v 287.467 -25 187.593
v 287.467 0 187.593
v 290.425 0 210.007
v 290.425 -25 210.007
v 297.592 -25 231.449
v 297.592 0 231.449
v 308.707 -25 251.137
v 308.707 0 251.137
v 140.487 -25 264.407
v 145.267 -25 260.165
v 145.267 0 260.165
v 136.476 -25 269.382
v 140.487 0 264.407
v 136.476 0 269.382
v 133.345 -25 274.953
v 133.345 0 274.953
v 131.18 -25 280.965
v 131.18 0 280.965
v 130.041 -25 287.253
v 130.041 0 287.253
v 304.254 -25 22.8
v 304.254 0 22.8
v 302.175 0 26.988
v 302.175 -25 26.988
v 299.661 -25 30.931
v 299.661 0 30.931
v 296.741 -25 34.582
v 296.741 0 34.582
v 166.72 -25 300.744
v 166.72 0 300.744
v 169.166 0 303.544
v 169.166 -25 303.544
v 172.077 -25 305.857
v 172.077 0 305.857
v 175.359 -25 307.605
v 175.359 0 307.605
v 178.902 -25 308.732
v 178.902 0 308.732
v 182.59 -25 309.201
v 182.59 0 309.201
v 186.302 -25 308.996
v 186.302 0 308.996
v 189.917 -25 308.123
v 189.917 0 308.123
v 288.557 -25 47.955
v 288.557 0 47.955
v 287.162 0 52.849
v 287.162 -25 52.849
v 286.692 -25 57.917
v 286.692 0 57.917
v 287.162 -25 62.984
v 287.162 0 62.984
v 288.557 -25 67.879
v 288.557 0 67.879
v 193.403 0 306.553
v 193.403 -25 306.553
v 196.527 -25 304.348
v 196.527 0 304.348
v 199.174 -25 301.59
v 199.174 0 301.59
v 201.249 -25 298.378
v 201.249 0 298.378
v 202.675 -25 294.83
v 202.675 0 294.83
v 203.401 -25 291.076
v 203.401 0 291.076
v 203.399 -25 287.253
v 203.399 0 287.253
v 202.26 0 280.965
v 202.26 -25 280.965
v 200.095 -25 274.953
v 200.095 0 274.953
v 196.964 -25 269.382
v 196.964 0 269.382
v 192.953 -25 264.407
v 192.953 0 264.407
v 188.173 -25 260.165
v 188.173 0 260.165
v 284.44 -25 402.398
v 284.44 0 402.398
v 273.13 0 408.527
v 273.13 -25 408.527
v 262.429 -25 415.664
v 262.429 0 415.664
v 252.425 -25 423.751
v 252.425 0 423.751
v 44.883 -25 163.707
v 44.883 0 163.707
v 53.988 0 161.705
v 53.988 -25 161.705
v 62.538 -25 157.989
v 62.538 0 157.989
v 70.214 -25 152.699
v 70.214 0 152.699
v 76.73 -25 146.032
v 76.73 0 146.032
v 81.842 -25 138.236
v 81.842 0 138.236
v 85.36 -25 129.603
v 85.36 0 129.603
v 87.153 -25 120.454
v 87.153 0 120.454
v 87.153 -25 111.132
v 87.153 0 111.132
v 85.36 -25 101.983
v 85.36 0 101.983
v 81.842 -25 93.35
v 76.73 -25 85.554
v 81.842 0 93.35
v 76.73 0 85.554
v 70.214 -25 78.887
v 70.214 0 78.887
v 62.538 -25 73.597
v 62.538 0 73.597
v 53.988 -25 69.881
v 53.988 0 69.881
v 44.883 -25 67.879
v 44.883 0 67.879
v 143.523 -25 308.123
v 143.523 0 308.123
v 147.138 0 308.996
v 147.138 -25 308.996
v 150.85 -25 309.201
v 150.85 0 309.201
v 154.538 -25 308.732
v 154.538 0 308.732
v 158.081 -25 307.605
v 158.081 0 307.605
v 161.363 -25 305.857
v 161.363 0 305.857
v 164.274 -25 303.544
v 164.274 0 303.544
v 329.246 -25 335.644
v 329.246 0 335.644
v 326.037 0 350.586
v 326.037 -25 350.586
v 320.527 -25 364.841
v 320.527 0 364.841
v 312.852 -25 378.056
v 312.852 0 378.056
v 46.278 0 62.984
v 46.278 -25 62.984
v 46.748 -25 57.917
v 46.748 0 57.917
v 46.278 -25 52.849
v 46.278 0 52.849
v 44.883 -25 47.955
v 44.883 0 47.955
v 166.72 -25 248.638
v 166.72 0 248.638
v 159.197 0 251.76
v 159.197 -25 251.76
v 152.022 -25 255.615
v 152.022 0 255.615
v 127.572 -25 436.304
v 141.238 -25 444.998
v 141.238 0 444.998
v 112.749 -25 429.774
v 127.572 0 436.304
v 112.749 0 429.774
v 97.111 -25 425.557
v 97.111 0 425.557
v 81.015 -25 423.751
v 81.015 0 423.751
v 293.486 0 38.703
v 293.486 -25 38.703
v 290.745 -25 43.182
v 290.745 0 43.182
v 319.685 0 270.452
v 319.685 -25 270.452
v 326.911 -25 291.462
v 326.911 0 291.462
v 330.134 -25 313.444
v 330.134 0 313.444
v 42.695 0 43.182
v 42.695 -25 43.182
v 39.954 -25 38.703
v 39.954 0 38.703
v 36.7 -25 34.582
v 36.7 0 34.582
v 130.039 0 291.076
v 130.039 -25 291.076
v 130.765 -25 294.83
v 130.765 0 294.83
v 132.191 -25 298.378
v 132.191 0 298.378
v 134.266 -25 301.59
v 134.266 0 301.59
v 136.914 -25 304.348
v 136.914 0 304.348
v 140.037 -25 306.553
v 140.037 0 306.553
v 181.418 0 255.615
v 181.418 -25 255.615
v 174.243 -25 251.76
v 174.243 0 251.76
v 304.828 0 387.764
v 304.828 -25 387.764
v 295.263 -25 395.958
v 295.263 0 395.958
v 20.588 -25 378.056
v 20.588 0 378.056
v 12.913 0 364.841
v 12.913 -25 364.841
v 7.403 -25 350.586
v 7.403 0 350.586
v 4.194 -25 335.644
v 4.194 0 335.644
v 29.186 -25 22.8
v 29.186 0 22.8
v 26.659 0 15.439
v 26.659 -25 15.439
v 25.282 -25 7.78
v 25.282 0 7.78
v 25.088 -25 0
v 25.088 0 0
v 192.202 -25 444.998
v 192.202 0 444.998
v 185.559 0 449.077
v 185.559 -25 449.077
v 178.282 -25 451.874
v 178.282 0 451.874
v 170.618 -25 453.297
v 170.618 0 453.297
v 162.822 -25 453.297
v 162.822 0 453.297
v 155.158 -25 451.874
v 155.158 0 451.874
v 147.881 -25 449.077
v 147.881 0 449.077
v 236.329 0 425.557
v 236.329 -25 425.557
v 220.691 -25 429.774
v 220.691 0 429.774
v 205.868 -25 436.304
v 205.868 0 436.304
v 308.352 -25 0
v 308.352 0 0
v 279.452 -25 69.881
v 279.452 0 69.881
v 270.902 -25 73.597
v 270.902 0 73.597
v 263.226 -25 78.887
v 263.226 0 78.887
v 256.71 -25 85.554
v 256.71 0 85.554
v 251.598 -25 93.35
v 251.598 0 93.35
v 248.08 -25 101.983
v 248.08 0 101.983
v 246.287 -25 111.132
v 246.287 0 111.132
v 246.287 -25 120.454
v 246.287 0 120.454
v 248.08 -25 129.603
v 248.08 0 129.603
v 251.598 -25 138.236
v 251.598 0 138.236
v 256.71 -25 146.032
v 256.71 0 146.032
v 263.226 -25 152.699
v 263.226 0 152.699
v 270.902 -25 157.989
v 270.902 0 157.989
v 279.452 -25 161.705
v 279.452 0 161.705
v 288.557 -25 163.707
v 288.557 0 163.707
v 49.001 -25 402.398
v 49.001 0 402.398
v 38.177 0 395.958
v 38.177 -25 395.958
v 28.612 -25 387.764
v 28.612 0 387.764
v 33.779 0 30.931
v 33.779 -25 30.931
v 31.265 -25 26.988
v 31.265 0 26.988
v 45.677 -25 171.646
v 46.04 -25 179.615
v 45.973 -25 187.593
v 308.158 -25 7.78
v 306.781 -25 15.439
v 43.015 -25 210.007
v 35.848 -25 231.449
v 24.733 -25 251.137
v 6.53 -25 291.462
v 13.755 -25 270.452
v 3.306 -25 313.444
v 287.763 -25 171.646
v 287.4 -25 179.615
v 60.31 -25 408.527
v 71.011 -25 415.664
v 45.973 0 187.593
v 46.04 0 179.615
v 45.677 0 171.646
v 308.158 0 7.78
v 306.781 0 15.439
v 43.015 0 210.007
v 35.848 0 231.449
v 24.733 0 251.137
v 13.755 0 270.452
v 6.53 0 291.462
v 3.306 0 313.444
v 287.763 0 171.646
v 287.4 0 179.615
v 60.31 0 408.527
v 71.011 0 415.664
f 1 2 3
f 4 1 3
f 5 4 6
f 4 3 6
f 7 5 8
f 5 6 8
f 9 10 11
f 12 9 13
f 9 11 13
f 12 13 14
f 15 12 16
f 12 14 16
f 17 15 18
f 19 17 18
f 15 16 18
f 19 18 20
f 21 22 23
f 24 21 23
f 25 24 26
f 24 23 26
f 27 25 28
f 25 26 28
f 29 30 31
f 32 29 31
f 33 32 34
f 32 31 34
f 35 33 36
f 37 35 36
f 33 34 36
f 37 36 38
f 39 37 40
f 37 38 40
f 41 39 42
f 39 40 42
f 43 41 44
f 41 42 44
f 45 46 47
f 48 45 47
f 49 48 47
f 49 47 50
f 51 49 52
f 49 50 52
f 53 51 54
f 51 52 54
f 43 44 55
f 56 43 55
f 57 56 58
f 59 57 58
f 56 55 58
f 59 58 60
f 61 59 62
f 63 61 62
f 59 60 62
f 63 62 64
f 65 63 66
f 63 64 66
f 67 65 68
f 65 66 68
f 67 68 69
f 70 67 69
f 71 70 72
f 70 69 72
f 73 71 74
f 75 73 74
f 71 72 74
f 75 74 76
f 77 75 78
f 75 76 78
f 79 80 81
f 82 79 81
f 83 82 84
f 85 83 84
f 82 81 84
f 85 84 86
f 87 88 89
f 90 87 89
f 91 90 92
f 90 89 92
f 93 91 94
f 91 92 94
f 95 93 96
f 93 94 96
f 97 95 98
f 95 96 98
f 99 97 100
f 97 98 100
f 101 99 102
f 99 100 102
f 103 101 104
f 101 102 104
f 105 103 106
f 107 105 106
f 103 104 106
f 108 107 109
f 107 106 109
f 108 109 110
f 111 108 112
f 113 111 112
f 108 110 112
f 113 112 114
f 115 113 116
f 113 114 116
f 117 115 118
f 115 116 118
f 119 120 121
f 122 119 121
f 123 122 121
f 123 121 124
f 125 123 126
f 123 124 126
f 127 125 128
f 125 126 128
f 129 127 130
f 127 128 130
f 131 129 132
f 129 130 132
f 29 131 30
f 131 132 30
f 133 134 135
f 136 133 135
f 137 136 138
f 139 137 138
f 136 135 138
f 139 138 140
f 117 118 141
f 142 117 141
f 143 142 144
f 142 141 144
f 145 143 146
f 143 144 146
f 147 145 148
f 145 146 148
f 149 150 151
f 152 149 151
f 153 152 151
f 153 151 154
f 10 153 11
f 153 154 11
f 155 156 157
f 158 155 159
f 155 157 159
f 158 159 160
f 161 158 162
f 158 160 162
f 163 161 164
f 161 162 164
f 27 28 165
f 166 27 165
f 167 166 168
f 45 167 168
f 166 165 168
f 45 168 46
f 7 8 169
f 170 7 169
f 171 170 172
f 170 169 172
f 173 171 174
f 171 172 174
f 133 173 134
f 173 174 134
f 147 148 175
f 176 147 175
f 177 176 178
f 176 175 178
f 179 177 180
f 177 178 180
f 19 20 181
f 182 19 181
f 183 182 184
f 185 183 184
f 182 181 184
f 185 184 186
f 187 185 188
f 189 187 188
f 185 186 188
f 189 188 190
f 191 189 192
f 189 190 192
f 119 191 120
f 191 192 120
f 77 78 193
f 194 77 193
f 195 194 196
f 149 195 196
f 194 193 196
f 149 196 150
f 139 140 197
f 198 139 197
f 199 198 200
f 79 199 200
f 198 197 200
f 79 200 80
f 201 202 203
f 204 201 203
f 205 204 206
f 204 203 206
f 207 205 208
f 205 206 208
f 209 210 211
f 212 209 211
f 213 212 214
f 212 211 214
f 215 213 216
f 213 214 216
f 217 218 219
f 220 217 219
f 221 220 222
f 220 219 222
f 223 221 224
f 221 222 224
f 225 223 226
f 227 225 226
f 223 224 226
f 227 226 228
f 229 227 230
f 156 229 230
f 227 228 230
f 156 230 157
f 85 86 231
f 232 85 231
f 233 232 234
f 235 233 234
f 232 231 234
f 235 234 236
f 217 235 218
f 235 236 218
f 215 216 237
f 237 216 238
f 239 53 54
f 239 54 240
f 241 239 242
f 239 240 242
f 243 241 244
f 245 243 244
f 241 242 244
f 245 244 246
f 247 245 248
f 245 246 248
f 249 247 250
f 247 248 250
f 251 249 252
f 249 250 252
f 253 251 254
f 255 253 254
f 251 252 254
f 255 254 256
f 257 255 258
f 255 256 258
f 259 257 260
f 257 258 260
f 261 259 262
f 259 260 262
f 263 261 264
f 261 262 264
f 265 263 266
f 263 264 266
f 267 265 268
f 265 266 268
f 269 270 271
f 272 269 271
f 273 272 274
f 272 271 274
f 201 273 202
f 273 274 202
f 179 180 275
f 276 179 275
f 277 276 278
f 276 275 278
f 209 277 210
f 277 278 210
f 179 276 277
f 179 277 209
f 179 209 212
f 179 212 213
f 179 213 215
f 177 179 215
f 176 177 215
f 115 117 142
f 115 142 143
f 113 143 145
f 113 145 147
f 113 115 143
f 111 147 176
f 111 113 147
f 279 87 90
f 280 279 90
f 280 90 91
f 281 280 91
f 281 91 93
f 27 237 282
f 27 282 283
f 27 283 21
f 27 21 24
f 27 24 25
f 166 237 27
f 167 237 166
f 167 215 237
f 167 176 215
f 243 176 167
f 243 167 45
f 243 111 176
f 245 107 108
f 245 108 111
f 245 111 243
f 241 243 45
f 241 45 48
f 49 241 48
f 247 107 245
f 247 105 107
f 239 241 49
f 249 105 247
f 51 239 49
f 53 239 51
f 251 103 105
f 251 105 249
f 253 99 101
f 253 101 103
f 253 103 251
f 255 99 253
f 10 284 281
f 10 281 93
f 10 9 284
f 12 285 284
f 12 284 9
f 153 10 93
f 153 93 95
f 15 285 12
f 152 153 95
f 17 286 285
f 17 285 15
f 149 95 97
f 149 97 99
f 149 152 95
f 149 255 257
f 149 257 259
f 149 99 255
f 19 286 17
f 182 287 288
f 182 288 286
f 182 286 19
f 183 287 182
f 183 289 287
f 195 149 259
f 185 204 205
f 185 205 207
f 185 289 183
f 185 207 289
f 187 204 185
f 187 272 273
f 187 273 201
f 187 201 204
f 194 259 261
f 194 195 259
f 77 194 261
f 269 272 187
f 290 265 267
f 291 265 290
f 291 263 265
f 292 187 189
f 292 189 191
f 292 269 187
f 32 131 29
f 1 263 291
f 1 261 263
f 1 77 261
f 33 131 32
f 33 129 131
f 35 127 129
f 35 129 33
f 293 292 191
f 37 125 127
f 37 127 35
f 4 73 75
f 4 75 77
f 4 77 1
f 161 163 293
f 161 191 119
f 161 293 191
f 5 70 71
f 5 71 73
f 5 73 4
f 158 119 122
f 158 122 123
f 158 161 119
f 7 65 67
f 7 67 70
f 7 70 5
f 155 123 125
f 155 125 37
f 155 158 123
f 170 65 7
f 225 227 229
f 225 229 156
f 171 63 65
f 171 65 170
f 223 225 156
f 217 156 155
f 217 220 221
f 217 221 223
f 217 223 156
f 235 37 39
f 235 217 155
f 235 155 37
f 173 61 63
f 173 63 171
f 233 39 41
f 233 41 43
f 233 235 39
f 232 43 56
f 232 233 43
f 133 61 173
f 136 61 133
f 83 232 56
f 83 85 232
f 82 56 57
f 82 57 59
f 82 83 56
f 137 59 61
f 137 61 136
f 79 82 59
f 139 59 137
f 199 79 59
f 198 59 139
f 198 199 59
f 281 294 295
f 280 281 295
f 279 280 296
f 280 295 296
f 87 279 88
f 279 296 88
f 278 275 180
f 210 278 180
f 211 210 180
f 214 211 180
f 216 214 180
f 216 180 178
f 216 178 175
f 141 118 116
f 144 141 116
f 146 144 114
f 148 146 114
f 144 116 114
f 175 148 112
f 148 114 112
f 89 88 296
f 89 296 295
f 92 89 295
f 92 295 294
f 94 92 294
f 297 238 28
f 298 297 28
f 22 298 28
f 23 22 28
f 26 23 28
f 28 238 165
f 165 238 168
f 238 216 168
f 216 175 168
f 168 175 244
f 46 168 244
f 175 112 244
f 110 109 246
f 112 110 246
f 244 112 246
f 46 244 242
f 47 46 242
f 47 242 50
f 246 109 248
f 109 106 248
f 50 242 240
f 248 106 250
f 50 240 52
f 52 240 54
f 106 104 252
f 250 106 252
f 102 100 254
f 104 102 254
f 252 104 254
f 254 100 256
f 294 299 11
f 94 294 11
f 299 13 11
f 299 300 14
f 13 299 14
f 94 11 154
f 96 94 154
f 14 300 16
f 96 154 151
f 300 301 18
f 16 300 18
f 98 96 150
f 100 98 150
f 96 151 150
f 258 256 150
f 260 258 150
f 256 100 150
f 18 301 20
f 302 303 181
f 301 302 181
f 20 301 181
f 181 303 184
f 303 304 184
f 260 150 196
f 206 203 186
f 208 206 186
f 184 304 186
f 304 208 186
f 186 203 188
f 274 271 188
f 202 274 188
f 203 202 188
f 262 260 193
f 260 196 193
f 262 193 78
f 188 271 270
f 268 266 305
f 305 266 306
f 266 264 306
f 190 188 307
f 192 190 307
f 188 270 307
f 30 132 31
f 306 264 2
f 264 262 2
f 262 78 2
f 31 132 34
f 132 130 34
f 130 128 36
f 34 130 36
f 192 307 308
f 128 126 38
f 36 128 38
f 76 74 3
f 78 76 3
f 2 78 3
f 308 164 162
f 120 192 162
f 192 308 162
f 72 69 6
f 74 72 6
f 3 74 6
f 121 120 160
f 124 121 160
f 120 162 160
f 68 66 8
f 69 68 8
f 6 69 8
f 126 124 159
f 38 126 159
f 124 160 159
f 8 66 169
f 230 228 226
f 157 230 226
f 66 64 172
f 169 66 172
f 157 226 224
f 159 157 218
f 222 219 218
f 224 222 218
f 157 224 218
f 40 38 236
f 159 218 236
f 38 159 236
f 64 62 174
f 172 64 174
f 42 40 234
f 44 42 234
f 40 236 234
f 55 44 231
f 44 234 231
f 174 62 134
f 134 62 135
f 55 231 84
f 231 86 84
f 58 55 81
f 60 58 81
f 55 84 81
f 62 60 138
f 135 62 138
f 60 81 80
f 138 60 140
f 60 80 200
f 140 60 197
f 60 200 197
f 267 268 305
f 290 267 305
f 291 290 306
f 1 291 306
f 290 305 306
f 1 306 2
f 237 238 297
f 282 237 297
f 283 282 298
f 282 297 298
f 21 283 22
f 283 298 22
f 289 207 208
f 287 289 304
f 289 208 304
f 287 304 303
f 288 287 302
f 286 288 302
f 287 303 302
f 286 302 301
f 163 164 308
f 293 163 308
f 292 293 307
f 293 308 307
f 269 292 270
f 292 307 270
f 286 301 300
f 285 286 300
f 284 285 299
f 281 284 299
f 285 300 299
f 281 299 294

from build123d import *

# Parameters (mm, degrees)
F1_DEPTH = 25


with BuildPart() as f1:
    # F0 (on Front) → F1 (new body)
    with BuildSketch(Plane.XZ):
        with BuildLine():
            ThreePointArc((141.238138, 444.997787), (112.749463, 429.773668), (81.014585, 423.750718))
            ThreePointArc((81.014585, 423.750718), (65.741999, 411.97311), (49.000544, 402.397745))
            ThreePointArc((49.000544, 402.397745), (33.218565, 392.066346), (20.588335, 378.056139))
            ThreePointArc((20.588335, 378.056139), (9.877069, 357.822031), (4.194495, 335.644143))
            ThreePointArc((4.194495, 335.644143), (6.529558, 291.46217), (24.733176, 251.136899))
            ThreePointArc((24.733176, 251.136899), (39.945084, 220.899663), (45.972874, 187.592631))
            ThreePointArc((45.972874, 187.592631), (45.912459, 175.6279), (44.882946, 163.70739))
            ThreePointArc((44.882946, 163.70739), (87.378349, 115.792993), (44.882946, 67.878596))
            ThreePointArc((44.882946, 67.878596), (46.748425, 57.916658), (44.882946, 47.95472))
            ThreePointArc((44.882946, 47.95472), (41.39103, 40.901455), (36.6995, 34.582313))
            ThreePointArc((36.6995, 34.582313), (32.469146, 28.993084), (29.186027, 22.799822))
            ThreePointArc((29.186027, 22.799822), (25.823713, 11.635955), (25.087768, 0))
            Line((25.087768, 0), (308.352295, 0))
            ThreePointArc((308.352295, 0), (307.61635, 11.635955), (304.254036, 22.799822))
            ThreePointArc((304.254036, 22.799822), (300.970917, 28.993084), (296.740563, 34.582313))
            ThreePointArc((296.740563, 34.582313), (292.049033, 40.901455), (288.557117, 47.95472))
            ThreePointArc((288.557117, 47.95472), (286.691638, 57.916658), (288.557117, 67.878596))
            ThreePointArc((288.557117, 67.878596), (246.061714, 115.792993), (288.557117, 163.70739))
            ThreePointArc((288.557117, 163.70739), (287.527604, 175.6279), (287.467189, 187.592631))
            ThreePointArc((287.467189, 187.592631), (293.494979, 220.899663), (308.706887, 251.136899))
            ThreePointArc((308.706887, 251.136899), (326.910505, 291.46217), (329.245568, 335.644143))
            ThreePointArc((329.245568, 335.644143), (323.562994, 357.822031), (312.851728, 378.056139))
            ThreePointArc((312.851728, 378.056139), (300.221498, 392.066346), (284.439519, 402.397745))
            ThreePointArc((284.439519, 402.397745), (267.698064, 411.97311), (252.425478, 423.750718))
            ThreePointArc((252.425478, 423.750718), (220.6906, 429.773668), (192.201925, 444.997787))
            ThreePointArc((192.201925, 444.997787), (166.720032, 453.476058), (141.238138, 444.997787))
        make_face()
        with BuildLine():
            ThreePointArc((166.720032, 300.744148), (177.104622, 308.249052), (189.916627, 308.123254))
            ThreePointArc((189.916627, 308.123254), (200.288352, 300.033358), (203.399401, 287.252887))
            ThreePointArc((203.399401, 287.252887), (198.645247, 272.102034), (188.17311, 260.16534))
            ThreePointArc((188.17311, 260.16534), (177.878406, 253.598127), (166.720032, 248.638297))
            ThreePointArc((166.720032, 248.638297), (155.561657, 253.598127), (145.266953, 260.16534))
            ThreePointArc((145.266953, 260.16534), (134.794816, 272.102034), (130.040662, 287.252887))
            ThreePointArc((130.040662, 287.252887), (133.151711, 300.033358), (143.523436, 308.123254))
            ThreePointArc((143.523436, 308.123254), (156.335441, 308.249052), (166.720032, 300.744148))
        make_face(mode=Mode.SUBTRACT)
    extrude(amount=F1_DEPTH)


solid = f1.part
